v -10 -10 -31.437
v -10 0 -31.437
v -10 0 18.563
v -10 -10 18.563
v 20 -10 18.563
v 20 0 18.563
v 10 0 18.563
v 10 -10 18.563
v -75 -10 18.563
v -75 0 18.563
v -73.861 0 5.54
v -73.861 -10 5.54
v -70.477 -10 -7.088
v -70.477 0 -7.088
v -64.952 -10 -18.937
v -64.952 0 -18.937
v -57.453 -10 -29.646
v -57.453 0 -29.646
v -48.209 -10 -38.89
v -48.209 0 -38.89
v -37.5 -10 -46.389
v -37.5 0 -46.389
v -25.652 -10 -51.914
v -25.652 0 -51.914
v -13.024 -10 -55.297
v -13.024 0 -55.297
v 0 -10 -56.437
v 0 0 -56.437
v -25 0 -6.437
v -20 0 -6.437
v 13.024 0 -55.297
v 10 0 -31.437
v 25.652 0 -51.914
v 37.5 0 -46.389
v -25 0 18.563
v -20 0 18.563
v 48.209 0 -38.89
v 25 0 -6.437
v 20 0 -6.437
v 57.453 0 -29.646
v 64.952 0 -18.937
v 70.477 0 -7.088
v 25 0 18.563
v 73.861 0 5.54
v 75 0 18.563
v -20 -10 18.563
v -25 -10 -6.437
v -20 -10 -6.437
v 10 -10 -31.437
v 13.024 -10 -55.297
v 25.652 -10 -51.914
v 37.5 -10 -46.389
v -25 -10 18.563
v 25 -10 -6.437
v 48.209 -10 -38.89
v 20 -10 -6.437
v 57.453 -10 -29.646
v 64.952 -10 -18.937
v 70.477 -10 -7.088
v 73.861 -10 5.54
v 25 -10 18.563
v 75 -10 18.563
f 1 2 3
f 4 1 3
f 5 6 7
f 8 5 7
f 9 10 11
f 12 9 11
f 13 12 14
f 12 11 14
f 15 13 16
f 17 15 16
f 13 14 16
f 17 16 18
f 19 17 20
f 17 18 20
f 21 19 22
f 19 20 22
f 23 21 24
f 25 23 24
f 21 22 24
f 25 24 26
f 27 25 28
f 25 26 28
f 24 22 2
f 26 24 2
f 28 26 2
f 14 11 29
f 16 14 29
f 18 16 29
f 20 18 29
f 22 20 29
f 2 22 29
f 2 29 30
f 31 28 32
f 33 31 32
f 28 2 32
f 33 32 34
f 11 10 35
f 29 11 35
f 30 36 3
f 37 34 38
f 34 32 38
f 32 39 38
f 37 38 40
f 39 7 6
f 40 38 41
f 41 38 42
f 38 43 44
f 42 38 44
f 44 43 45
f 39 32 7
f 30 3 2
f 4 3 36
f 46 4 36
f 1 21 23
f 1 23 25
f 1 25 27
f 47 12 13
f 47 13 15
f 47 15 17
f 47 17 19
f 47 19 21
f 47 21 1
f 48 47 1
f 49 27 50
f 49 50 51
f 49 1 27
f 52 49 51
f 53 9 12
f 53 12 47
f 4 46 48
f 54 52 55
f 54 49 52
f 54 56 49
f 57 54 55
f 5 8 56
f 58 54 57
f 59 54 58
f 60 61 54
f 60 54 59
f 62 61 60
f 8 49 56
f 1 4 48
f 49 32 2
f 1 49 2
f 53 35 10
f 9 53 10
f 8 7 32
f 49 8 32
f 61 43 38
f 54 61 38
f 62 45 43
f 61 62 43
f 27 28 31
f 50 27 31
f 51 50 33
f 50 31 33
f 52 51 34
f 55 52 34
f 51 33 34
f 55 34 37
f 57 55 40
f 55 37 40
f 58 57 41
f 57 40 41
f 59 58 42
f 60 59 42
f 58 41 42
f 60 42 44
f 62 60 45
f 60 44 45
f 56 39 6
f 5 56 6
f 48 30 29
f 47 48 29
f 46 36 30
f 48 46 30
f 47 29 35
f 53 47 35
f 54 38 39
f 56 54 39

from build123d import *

# Parameters (mm, degrees)
F1_DEPTH = 10


with BuildPart() as f1:
    # F0 (on Front) → F1 (new body)
    with BuildSketch(Plane.XZ):
        with BuildLine():
            Line((-10, 18.563321), (-20, 18.563321))
            Line((-20, 18.563321), (-20, -6.436679))
            Line((-20, -6.436679), (-25, -6.436679))
            Line((-25, -6.436679), (-25, 18.563321))
            Line((-25, 18.563321), (-75, 18.563321))
            ThreePointArc((-75, 18.563321), (-53.033009, -34.469688), (0, -56.436679))
            ThreePointArc((0, -56.436679), (53.033009, -34.469688), (75, 18.563321))
            Line((75, 18.563321), (25, 18.563321))
            Line((25, 18.563321), (25, -6.436679))
            Line((25, -6.436679), (20, -6.436679))
            Line((20, -6.436679), (20, 18.563321))
            Line((20, 18.563321), (10, 18.563321))
            Line((10, 18.563321), (10, -31.436679))
            Line((10, -31.436679), (0, -31.436679))
            Line((0, -31.436679), (-10, -31.436679))
            Line((-10, -31.436679), (-10, 18.563321))
        make_face()
    extrude(amount=F1_DEPTH)


solid = f1.part
